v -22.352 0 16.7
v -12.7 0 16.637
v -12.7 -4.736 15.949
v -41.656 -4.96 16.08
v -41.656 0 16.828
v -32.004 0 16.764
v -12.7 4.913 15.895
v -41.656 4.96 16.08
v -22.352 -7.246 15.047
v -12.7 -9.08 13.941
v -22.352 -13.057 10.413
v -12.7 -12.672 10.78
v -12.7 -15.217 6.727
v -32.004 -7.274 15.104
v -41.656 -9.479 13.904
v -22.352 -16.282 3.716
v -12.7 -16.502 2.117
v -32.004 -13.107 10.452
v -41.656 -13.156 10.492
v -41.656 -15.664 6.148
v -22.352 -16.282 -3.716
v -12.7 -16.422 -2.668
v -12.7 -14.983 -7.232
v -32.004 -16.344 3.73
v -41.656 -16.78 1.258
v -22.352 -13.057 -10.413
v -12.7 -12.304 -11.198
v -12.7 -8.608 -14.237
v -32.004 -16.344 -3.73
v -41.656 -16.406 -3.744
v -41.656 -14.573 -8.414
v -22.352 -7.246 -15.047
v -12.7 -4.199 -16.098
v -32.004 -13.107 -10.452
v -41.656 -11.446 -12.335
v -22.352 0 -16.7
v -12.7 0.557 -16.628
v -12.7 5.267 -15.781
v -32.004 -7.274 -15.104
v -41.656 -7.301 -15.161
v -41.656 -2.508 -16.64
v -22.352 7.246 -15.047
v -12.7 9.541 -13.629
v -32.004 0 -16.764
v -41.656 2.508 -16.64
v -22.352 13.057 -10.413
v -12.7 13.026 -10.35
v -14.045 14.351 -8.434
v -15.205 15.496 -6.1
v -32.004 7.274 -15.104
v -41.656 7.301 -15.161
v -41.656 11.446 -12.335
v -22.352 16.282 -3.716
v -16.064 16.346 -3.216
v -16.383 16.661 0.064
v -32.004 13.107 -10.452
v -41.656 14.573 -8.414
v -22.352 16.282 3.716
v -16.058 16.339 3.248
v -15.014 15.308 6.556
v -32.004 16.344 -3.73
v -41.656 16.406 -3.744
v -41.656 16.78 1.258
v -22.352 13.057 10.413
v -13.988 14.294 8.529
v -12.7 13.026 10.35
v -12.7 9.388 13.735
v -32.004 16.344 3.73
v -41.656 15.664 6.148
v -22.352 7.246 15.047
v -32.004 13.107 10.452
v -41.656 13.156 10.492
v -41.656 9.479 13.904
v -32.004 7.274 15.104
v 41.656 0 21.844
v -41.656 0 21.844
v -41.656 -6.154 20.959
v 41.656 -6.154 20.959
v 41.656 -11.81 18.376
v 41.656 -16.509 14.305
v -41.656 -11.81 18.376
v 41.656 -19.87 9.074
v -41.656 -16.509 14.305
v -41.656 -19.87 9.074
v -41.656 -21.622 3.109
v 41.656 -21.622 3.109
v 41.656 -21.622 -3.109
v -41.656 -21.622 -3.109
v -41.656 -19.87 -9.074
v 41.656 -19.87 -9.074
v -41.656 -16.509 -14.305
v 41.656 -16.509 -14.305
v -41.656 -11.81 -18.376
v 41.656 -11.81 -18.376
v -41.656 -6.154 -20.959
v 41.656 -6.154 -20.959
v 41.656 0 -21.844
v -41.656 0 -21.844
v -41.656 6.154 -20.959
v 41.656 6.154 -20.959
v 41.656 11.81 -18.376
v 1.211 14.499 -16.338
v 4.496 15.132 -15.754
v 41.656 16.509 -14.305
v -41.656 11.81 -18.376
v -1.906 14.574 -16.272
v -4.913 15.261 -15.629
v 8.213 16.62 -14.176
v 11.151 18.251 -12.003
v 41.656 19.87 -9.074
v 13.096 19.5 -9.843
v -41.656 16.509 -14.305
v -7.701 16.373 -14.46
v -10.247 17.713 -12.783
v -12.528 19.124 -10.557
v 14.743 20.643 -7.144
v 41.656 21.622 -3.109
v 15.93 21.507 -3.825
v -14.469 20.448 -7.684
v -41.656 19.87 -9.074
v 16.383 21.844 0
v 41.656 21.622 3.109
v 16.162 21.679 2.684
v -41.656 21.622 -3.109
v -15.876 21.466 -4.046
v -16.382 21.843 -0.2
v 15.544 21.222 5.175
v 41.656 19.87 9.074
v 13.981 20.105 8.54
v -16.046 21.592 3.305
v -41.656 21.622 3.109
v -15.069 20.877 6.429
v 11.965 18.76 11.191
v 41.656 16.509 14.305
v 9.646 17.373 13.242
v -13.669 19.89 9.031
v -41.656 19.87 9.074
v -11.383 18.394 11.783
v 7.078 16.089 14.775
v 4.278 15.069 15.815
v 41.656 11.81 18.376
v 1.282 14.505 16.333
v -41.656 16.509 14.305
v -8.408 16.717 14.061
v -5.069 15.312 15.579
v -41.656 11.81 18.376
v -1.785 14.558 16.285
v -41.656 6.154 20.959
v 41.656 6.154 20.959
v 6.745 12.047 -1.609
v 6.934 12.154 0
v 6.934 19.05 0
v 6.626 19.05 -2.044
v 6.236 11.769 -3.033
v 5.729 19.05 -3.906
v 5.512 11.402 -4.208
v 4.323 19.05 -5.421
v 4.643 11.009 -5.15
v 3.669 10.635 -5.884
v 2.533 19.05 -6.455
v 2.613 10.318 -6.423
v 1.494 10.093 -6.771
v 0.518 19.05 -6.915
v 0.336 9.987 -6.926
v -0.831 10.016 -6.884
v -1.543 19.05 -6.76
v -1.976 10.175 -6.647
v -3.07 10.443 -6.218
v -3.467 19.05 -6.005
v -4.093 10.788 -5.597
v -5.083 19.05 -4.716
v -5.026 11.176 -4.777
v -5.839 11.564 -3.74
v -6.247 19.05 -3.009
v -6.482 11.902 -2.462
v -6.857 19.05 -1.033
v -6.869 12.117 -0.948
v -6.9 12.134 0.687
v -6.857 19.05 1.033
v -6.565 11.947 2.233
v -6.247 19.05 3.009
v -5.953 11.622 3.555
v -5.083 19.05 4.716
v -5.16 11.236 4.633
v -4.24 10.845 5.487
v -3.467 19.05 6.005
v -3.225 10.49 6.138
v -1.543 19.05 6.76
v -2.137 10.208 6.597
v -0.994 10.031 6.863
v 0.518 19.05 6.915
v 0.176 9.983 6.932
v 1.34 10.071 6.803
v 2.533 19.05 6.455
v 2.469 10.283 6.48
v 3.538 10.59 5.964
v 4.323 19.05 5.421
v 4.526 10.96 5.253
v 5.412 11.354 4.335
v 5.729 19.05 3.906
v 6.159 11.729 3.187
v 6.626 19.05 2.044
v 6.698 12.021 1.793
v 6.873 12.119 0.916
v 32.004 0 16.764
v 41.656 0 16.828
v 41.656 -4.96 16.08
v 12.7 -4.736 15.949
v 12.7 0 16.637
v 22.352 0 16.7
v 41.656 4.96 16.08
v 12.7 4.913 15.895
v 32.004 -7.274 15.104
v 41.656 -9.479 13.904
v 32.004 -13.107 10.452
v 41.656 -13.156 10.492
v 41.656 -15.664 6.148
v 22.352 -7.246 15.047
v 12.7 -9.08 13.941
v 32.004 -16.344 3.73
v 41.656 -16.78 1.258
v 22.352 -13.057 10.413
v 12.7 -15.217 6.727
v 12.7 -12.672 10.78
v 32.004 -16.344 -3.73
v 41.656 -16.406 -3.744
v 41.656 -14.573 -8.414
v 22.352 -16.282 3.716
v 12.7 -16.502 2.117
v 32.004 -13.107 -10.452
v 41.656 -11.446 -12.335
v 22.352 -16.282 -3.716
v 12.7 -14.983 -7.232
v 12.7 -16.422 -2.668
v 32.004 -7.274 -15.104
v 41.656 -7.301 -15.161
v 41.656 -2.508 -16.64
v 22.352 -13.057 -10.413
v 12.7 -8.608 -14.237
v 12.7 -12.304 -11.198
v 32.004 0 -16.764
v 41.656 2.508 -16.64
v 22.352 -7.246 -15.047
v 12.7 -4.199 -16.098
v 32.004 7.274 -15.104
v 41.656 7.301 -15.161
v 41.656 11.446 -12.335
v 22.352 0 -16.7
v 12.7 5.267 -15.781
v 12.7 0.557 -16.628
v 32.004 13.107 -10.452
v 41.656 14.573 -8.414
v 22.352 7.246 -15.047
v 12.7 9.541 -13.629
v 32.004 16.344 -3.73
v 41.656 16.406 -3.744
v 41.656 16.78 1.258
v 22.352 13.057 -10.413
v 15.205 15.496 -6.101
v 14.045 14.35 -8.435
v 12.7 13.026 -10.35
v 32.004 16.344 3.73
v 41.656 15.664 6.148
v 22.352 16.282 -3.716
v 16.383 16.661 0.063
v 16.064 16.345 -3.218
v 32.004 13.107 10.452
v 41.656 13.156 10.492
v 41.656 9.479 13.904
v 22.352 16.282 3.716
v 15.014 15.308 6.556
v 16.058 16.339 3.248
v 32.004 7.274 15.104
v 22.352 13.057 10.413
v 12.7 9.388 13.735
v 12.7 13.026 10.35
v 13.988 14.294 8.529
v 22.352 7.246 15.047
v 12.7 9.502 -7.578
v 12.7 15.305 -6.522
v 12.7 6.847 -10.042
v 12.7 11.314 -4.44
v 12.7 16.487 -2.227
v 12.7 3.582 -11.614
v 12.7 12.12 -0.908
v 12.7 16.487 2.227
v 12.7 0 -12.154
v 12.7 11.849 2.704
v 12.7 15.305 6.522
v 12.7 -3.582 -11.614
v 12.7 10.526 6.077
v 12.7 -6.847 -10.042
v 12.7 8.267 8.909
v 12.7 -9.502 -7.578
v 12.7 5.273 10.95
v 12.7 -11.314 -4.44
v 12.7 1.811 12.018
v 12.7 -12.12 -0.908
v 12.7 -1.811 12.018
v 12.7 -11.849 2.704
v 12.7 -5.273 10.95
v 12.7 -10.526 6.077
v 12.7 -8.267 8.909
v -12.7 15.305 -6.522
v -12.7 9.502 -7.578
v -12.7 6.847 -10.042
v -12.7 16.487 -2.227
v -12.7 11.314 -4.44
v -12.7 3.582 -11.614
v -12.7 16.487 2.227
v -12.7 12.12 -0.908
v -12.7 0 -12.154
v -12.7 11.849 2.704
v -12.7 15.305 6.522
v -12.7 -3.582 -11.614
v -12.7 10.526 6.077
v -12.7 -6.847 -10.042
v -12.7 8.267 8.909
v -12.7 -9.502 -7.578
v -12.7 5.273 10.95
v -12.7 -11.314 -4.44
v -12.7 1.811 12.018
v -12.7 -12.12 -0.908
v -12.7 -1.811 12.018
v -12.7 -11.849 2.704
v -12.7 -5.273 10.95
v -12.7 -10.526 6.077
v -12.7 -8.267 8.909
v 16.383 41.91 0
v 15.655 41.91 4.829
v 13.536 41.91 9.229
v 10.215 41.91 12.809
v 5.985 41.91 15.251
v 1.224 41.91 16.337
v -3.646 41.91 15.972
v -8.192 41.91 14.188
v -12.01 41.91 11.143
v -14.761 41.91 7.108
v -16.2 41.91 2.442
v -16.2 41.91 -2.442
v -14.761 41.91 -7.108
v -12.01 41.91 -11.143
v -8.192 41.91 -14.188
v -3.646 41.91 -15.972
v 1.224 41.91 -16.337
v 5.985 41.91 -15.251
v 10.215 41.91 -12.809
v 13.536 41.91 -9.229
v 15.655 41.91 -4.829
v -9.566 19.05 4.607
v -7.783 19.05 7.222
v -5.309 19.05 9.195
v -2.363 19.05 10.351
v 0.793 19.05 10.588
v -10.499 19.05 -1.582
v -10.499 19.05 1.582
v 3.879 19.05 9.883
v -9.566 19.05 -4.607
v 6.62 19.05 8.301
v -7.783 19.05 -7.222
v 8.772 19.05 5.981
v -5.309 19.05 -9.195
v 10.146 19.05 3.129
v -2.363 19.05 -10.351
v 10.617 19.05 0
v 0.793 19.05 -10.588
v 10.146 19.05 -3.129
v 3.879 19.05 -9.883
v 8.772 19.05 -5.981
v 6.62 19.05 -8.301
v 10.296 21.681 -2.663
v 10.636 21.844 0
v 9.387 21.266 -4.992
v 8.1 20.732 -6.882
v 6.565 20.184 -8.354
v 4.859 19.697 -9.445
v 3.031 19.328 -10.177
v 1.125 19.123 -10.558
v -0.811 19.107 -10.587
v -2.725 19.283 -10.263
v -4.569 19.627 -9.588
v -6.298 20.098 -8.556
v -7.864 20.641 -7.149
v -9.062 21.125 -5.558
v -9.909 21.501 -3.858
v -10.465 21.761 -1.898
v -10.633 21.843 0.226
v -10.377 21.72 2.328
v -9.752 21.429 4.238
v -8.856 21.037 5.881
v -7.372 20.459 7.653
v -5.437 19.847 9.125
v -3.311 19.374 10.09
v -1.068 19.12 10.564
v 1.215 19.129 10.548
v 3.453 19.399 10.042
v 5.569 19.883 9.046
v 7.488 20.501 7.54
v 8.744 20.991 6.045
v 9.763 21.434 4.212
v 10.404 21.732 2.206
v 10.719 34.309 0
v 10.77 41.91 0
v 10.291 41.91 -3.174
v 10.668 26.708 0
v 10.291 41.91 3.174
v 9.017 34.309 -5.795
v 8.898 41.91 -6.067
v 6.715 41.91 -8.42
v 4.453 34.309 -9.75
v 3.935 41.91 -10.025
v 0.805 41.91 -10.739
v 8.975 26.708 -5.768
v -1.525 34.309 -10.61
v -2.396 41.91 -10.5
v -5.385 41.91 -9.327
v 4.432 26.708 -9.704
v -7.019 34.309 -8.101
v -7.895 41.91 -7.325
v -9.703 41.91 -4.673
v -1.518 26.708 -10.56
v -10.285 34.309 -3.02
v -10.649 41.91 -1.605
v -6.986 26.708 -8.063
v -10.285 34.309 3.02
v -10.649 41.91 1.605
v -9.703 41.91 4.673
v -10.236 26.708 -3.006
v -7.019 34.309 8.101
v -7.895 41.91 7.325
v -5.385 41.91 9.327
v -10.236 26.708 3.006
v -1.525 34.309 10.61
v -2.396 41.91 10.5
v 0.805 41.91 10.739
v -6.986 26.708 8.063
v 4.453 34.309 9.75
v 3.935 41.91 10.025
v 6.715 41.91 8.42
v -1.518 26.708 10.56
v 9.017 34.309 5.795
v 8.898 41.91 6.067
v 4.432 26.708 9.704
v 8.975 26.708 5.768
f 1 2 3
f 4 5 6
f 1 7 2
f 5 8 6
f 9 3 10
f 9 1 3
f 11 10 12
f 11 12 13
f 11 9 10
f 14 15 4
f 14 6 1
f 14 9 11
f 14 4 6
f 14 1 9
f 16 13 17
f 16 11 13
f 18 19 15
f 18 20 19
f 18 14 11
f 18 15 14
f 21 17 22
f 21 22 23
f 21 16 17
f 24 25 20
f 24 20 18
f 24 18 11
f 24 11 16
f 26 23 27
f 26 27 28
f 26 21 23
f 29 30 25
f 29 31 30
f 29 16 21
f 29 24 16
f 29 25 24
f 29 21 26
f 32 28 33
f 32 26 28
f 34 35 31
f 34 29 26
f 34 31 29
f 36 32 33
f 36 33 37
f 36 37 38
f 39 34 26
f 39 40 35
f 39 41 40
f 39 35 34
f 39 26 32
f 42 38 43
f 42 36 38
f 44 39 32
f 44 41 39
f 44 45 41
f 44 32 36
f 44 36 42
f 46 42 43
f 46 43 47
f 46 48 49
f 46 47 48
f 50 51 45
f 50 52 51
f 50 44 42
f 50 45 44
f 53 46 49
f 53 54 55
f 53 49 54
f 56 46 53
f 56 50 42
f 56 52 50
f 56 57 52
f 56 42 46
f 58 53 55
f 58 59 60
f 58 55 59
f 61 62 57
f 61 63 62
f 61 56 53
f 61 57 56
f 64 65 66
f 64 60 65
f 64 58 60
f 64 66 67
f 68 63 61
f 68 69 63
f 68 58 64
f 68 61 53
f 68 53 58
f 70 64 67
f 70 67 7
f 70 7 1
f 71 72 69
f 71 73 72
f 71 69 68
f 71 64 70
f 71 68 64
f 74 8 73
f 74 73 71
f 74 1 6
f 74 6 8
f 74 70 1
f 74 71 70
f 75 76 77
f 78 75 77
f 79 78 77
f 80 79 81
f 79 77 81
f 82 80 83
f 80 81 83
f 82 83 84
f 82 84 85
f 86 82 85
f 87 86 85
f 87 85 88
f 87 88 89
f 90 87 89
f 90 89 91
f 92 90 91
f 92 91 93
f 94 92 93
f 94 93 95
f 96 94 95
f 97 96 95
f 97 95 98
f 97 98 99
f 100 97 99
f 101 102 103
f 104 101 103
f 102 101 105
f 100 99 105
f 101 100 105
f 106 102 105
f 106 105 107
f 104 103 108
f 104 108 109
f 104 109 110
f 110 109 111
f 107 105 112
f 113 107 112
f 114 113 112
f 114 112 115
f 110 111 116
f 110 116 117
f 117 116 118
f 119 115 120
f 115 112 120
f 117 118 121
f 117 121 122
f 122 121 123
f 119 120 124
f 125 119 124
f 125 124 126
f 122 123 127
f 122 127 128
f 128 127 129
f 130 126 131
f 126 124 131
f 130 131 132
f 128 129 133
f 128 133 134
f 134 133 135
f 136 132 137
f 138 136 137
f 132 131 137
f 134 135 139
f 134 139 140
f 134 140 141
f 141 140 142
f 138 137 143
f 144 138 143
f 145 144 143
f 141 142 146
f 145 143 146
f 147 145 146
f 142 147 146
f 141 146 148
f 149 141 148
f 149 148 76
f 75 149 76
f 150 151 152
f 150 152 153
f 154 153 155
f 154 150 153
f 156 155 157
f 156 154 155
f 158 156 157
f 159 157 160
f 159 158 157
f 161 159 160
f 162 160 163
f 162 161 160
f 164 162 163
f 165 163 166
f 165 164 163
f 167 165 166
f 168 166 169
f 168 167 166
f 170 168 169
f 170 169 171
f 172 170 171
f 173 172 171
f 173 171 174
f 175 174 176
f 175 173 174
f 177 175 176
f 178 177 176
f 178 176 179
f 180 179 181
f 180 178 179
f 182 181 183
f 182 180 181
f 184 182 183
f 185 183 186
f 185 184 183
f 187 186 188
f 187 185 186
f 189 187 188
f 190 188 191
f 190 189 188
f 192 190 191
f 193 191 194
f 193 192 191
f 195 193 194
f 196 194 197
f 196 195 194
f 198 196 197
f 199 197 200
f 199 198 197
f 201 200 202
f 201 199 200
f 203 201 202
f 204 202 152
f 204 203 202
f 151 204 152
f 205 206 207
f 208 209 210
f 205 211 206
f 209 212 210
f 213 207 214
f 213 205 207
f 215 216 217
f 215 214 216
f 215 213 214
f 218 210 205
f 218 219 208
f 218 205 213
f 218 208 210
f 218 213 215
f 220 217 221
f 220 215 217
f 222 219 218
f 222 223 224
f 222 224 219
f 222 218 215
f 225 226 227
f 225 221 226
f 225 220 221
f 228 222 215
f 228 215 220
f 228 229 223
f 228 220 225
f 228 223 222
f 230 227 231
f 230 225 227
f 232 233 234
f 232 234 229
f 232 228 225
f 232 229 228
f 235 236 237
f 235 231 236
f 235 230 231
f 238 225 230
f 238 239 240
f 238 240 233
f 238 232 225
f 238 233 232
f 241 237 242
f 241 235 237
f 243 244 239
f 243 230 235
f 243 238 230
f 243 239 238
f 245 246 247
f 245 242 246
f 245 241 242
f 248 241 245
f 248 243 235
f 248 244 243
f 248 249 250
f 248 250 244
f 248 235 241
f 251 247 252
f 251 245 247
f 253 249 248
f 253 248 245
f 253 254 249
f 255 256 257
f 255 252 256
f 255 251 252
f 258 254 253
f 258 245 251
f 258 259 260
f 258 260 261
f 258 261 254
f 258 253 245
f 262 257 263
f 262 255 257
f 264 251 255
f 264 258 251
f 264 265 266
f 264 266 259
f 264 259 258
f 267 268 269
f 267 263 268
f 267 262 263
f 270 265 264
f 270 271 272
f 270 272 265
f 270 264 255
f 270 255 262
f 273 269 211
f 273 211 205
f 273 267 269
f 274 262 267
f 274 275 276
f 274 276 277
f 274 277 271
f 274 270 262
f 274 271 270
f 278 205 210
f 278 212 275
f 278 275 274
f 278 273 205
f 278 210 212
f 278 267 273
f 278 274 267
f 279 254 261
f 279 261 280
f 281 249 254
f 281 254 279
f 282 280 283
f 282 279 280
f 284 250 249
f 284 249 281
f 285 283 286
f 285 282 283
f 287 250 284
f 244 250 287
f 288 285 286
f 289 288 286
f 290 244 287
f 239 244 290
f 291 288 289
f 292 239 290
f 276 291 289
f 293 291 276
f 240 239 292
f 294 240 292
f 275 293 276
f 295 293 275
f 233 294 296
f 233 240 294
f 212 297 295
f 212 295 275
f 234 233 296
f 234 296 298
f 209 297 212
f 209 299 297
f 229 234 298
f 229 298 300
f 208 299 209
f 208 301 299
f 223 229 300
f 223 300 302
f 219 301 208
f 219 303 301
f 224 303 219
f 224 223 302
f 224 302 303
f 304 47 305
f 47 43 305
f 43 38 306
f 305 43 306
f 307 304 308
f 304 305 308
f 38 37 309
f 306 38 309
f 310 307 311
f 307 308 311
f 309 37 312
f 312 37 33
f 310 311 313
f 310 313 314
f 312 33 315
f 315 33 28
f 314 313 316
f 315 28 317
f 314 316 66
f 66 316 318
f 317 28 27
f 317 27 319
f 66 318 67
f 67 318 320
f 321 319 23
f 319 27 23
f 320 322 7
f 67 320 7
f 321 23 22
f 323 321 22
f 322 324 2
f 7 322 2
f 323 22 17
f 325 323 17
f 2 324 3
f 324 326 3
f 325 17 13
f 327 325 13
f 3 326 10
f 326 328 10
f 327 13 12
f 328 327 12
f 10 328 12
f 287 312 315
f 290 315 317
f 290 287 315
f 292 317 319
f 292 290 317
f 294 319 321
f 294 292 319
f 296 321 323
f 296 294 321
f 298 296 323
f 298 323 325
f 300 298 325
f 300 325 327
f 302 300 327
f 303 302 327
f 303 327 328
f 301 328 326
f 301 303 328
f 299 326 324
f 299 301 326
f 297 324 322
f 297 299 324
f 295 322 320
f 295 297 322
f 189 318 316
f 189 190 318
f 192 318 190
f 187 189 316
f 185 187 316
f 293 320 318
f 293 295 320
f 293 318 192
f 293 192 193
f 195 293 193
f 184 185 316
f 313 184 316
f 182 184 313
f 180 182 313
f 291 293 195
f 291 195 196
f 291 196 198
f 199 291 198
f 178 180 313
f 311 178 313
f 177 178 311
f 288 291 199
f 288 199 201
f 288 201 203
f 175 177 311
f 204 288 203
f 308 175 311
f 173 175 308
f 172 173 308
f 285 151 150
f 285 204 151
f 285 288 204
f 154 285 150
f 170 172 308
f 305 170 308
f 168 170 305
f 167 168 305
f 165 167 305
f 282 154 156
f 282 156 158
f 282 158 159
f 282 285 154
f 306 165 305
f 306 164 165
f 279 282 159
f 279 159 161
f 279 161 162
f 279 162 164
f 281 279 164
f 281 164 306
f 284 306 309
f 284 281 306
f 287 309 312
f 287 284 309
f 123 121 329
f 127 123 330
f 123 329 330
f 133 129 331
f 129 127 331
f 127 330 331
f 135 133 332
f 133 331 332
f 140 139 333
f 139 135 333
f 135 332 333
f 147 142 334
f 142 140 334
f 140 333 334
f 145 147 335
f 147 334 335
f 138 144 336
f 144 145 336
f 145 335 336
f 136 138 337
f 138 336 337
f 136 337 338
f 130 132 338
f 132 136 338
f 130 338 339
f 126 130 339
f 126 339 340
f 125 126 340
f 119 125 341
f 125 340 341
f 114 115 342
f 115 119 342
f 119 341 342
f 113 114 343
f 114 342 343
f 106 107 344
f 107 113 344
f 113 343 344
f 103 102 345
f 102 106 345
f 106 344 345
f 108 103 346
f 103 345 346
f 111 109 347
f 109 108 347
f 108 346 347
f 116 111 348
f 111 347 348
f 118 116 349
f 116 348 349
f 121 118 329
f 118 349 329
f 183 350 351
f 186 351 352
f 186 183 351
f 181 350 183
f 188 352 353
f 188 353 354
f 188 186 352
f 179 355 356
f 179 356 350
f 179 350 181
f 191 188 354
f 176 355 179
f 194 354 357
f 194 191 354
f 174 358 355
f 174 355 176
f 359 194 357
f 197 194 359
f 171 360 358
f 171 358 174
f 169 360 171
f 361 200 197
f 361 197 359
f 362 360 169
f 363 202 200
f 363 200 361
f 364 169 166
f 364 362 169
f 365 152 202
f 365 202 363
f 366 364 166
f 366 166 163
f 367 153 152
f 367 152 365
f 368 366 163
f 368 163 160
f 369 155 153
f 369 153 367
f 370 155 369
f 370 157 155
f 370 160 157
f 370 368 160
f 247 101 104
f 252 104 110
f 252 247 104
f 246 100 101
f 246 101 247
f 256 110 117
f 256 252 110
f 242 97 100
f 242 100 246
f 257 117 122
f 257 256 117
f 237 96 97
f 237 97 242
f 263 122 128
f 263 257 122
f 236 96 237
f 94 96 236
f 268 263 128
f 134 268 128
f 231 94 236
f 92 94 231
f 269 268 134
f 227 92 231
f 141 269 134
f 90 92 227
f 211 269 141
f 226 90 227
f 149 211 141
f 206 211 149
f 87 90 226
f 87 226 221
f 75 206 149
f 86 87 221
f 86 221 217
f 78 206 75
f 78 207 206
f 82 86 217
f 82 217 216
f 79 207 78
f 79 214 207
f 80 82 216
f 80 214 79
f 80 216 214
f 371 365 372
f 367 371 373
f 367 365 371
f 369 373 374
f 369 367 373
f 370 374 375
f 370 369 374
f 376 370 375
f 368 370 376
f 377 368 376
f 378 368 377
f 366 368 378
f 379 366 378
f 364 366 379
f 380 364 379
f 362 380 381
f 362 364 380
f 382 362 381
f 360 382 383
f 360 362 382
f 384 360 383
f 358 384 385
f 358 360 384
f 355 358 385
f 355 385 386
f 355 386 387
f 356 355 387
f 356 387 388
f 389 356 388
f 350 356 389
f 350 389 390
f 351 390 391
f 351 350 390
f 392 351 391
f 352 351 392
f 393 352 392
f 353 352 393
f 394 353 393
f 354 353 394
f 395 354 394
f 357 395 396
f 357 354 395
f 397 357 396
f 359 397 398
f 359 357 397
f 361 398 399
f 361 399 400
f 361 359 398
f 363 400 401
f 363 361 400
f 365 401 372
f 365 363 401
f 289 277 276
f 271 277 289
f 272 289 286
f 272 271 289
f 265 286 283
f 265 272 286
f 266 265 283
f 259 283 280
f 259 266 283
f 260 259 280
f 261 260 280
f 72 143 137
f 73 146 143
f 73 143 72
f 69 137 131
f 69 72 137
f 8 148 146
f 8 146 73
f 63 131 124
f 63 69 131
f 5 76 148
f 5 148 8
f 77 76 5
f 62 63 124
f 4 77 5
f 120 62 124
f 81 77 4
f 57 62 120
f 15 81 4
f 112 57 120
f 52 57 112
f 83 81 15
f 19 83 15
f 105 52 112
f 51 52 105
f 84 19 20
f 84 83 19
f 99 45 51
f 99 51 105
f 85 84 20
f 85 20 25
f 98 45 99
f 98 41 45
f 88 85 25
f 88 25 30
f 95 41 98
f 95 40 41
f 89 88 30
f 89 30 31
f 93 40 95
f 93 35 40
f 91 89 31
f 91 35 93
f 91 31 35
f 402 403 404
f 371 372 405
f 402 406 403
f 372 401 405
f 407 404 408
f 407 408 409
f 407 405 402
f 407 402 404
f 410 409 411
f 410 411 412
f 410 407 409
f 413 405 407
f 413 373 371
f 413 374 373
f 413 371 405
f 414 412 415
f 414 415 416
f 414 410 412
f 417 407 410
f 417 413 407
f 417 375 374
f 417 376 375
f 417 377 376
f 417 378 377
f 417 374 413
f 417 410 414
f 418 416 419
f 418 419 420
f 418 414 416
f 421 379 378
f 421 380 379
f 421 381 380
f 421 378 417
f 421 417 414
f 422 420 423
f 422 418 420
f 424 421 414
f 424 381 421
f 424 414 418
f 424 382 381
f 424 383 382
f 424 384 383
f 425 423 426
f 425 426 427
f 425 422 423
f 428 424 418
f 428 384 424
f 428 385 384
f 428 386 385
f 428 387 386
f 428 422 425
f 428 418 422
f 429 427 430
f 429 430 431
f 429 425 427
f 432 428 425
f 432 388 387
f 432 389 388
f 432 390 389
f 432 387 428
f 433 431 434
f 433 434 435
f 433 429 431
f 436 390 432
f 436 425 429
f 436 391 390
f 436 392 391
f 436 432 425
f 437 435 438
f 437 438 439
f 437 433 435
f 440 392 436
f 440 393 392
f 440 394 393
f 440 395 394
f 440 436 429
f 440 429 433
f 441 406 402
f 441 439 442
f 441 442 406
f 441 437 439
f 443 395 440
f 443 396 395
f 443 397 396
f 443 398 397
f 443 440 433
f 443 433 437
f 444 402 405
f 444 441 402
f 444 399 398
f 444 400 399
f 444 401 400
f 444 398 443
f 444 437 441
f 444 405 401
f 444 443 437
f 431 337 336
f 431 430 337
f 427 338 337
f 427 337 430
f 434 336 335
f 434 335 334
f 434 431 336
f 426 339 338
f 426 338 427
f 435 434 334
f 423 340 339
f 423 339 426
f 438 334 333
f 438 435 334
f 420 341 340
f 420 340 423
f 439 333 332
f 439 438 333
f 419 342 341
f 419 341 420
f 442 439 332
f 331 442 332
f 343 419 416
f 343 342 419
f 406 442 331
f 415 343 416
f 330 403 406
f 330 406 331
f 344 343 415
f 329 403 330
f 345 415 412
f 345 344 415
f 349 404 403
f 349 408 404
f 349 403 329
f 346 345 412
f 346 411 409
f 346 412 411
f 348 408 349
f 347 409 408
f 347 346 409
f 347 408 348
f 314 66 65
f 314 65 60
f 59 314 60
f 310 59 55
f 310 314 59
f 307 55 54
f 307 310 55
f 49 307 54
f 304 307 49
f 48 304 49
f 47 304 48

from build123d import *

# Parameters (mm, degrees)
SKETCH4_R           = 21.844
BOSS_EXTRUDE1_DEPTH = 25.4
SKETCH5_R           = 16.383
BOSS_EXTRUDE2_DEPTH = 19.05


with BuildPart() as part:
    # Sketch1 → Revolve1 (revolve)
    with BuildSketch(Plane.XY, mode=Mode.PRIVATE) as revolve1_sk:
        Polygon((-41.656, -21.844), (-12.7, -21.844), (-12.7, -16.637), (-41.656, -16.8275), align=None)
        Polygon((41.656, -16.8275), (12.7, -16.637), (12.7, -21.844), (41.656, -21.844), align=None)
    revolve(revolve1_sk.sketch.rotate(Axis((-41.656, 0, 0), (1, 0, 0)), 270), axis=Axis((-41.656, 0, 0), (1, 0, 0)))



with BuildPart() as body_2:
    # Sketch2 → Revolve2 (revolve)
    with BuildSketch(Plane.XY):
        Polygon((10.7696, 41.91), (10.6172, 19.05), (16.383, 19.05), (16.383, 41.91), align=None)
    revolve(axis=Axis((0, 0, 0), (0, 1, 0)))


with BuildPart() as part_1:
    add(part.part)

    add(body_2.part)  # Boss-Extrude1 merges body 2
    # Sketch4 → Boss-Extrude1 (add)
    with BuildSketch(Plane(origin=(-12.7, 0, 0), x_dir=(0, 0, -1), z_dir=(1, 0, 0))):
        with Locations(Location((0, 0, 0), (0, 0, 180))):
            Circle(SKETCH4_R)
    extrude(amount=BOSS_EXTRUDE1_DEPTH)

    # Sketch5 → Boss-Extrude2 (add)
    with BuildSketch(Plane.XZ.offset(-19.05)):
        Circle(SKETCH5_R)
    extrude(amount=BOSS_EXTRUDE2_DEPTH)

    # Sketch6 → Cut-Revolve1 (revolve, cut)
    with BuildSketch(Plane.XY, mode=Mode.PRIVATE) as cut_revolve1_sk:
        Polygon((-41.656, -16.8275), (-12.7, -16.637), (-12.7, -12.1539), (12.7, -12.1539), (12.7, -16.637), (41.656, -16.8275), (41.656, 0), (-41.656, 0), align=None)
    revolve(cut_revolve1_sk.sketch.rotate(Axis((41.656, 0, 0), (-1, 0, 0)), 270), axis=Axis((41.656, 0, 0), (-1, 0, 0)), mode=Mode.SUBTRACT)

    # Sketch7 → Cut-Revolve2 (revolve, cut)
    with BuildSketch(Plane.XY):
        Polygon((10.7696, 41.91), (10.6172, 19.05), (6.9342, 19.05), (6.9342, 0), (0, 0), (0, 41.91), align=None)
    revolve(axis=Axis((0, 0, 0), (0, 1, 0)), mode=Mode.SUBTRACT)


solid = part_1.part
